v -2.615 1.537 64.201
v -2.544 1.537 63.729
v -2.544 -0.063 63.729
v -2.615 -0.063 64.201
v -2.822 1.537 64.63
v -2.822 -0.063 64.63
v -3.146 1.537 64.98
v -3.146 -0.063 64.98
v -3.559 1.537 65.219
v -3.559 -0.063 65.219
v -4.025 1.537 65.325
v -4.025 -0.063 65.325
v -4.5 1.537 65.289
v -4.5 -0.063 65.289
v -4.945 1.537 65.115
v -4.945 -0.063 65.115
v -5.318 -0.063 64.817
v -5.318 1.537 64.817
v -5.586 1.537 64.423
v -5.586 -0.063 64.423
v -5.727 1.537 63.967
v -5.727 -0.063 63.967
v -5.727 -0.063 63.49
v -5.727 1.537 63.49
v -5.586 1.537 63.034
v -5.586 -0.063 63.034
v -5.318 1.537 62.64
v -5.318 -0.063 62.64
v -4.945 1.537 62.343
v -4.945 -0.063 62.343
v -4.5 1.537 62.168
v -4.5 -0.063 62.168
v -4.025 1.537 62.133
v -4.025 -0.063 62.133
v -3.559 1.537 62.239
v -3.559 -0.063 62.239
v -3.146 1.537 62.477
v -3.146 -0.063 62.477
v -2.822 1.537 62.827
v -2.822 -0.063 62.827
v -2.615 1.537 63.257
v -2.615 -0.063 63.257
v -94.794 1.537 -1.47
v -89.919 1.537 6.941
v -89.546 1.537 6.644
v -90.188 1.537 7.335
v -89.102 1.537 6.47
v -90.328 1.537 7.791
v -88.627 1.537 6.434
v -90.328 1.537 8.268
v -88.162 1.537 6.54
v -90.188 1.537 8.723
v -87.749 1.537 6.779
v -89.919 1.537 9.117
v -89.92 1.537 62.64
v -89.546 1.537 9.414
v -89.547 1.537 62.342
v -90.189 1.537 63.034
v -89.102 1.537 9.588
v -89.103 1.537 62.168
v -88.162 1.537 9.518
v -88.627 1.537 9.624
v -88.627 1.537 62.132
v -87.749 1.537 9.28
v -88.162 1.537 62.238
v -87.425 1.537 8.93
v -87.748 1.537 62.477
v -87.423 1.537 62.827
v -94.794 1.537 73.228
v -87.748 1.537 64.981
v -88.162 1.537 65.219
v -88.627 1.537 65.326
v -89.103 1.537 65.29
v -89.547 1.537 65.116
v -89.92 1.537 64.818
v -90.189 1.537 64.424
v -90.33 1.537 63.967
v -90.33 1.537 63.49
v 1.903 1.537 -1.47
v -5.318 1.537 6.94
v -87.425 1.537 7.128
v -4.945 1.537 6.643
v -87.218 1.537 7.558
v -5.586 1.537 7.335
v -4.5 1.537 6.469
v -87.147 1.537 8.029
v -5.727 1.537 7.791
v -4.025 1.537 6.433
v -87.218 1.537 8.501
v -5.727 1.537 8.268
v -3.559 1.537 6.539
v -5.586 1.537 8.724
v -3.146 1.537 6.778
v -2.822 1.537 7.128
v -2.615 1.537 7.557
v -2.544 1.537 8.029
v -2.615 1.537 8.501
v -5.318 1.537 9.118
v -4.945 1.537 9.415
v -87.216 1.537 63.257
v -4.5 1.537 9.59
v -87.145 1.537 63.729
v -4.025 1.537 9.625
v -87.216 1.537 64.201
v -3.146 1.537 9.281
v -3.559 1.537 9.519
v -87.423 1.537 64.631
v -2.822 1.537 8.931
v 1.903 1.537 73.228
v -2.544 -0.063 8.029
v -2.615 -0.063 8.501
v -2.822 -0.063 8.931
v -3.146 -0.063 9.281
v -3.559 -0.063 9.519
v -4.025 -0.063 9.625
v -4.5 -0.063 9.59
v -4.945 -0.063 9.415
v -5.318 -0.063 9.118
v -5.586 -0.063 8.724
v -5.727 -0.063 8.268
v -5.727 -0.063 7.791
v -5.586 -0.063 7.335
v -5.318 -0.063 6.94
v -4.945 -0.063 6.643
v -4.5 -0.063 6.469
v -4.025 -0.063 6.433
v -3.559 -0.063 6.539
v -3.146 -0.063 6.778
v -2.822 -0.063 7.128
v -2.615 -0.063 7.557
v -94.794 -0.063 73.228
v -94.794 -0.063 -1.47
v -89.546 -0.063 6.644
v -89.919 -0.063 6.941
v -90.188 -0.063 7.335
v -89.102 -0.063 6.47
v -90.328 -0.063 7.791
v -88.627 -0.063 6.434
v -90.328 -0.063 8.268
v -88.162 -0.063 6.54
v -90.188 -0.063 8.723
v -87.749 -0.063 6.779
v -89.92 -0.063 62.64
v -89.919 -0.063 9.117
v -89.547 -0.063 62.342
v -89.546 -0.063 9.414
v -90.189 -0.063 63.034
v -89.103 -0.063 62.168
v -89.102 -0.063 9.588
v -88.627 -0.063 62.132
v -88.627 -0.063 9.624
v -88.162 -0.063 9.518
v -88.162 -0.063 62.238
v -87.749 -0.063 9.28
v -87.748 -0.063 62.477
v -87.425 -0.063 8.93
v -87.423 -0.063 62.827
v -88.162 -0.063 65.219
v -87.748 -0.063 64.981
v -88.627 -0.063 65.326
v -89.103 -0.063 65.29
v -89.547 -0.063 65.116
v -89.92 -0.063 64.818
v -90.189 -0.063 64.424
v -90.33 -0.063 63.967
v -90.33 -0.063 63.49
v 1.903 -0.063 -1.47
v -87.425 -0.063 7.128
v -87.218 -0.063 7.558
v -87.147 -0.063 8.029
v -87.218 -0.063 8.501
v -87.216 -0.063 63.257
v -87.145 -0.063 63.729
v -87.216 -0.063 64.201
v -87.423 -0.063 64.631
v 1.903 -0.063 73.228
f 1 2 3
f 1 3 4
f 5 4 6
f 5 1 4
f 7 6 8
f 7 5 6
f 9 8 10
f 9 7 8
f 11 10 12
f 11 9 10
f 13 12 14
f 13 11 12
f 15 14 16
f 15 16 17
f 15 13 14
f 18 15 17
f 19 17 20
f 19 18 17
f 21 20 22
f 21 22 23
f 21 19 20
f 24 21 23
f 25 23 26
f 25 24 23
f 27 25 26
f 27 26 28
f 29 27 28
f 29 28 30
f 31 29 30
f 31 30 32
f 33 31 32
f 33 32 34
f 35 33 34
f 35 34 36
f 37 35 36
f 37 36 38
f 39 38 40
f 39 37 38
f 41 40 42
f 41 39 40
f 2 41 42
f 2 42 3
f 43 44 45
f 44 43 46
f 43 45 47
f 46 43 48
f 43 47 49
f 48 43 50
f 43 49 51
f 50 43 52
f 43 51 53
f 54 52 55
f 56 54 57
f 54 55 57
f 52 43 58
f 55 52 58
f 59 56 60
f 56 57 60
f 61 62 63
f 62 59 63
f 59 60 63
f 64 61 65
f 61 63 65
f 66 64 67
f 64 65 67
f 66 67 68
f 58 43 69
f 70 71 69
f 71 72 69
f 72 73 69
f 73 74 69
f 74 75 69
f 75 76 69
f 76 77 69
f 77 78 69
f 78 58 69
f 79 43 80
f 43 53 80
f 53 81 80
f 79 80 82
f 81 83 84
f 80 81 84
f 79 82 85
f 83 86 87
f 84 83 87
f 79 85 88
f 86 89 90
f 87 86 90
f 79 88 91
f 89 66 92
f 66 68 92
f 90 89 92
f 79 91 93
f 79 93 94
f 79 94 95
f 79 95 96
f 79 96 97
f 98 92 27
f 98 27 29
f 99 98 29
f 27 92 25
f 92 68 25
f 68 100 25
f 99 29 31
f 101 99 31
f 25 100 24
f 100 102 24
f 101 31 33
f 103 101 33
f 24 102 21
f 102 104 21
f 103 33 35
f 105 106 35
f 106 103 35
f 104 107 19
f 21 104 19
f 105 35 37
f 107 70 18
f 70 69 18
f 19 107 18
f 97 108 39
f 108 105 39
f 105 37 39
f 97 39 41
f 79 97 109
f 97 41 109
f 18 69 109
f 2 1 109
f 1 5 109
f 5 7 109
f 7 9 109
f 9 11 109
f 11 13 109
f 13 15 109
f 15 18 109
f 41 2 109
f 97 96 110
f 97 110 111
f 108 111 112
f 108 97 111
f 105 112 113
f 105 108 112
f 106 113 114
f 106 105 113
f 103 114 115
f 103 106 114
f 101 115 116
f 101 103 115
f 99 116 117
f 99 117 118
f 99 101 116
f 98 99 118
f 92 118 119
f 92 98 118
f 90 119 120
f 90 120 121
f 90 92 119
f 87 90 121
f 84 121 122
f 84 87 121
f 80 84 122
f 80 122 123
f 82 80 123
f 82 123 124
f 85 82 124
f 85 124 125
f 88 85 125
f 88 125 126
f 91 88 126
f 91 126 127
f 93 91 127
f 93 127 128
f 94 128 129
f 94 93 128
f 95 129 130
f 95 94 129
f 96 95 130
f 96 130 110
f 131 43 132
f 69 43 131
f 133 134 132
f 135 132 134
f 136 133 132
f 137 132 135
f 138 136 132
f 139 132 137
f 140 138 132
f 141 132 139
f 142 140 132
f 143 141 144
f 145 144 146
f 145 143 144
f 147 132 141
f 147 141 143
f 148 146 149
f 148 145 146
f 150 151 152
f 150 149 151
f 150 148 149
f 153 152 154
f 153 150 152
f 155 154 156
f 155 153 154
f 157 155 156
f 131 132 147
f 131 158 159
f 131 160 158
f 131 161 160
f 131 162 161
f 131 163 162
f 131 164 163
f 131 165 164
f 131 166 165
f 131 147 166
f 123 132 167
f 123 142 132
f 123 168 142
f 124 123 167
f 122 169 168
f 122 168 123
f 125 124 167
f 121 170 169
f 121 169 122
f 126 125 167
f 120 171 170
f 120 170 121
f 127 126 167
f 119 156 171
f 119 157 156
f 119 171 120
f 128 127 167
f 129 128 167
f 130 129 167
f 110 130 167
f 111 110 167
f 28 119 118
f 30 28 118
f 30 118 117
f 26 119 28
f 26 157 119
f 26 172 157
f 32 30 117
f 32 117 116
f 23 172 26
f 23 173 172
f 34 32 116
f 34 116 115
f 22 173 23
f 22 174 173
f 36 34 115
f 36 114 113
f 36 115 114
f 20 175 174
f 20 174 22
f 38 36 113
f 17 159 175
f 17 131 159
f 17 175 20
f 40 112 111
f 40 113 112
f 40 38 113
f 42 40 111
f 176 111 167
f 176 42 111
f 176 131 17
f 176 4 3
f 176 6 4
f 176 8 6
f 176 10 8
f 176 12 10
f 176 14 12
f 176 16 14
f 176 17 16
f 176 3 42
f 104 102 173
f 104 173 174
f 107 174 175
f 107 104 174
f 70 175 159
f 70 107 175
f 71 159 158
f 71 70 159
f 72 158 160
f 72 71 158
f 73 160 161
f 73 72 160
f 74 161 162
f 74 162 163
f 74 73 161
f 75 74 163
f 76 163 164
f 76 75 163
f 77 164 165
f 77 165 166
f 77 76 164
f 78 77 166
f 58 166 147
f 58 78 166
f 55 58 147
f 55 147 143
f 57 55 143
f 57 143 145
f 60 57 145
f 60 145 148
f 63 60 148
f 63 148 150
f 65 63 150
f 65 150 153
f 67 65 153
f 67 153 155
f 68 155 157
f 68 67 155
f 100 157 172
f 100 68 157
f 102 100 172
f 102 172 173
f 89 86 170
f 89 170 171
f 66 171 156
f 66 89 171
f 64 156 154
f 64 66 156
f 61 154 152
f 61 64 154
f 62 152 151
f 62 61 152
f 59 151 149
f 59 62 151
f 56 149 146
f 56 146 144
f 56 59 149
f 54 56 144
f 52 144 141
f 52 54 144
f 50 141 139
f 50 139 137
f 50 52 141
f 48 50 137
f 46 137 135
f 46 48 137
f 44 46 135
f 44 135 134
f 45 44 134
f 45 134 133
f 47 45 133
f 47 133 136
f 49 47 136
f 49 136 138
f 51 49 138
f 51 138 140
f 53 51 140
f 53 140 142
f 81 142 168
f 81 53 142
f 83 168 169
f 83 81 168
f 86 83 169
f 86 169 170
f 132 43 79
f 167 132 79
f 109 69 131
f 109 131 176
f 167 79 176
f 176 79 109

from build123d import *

# Parameters (mm, degrees)
F1_W     = 3.807
F1_H     = 2.9409
F1_R     = 0.0629689606
F1_R_2   = 0.0630157123
F1_R_3   = 0.0630453805
F2_DEPTH = 0.063
F3_SCALE = 25.4


with BuildPart() as f2:
    # F1 (on Front) → F2 (new body)
    with BuildSketch(Plane.XZ):
        Rectangle(F1_W, F1_H)
        with Locations((-1.6654, -1.09645)):
            Circle(F1_R, mode=Mode.SUBTRACT)
        with Locations((1.6654, -1.09645)):
            Circle(F1_R_2, mode=Mode.SUBTRACT)
        with Locations((-1.6654, 1.09645)):
            Circle(F1_R_3, mode=Mode.SUBTRACT)
        with Locations((1.6654, 1.09645)):
            Circle(F1_R_2, mode=Mode.SUBTRACT)
    extrude(amount=F2_DEPTH)


with BuildPart() as f2_1:
    # F3: moved
    add(f2.part.scale(F3_SCALE).moved(Location((-46.4454, 1.5372, 35.87898))))


solid = f2_1.part
